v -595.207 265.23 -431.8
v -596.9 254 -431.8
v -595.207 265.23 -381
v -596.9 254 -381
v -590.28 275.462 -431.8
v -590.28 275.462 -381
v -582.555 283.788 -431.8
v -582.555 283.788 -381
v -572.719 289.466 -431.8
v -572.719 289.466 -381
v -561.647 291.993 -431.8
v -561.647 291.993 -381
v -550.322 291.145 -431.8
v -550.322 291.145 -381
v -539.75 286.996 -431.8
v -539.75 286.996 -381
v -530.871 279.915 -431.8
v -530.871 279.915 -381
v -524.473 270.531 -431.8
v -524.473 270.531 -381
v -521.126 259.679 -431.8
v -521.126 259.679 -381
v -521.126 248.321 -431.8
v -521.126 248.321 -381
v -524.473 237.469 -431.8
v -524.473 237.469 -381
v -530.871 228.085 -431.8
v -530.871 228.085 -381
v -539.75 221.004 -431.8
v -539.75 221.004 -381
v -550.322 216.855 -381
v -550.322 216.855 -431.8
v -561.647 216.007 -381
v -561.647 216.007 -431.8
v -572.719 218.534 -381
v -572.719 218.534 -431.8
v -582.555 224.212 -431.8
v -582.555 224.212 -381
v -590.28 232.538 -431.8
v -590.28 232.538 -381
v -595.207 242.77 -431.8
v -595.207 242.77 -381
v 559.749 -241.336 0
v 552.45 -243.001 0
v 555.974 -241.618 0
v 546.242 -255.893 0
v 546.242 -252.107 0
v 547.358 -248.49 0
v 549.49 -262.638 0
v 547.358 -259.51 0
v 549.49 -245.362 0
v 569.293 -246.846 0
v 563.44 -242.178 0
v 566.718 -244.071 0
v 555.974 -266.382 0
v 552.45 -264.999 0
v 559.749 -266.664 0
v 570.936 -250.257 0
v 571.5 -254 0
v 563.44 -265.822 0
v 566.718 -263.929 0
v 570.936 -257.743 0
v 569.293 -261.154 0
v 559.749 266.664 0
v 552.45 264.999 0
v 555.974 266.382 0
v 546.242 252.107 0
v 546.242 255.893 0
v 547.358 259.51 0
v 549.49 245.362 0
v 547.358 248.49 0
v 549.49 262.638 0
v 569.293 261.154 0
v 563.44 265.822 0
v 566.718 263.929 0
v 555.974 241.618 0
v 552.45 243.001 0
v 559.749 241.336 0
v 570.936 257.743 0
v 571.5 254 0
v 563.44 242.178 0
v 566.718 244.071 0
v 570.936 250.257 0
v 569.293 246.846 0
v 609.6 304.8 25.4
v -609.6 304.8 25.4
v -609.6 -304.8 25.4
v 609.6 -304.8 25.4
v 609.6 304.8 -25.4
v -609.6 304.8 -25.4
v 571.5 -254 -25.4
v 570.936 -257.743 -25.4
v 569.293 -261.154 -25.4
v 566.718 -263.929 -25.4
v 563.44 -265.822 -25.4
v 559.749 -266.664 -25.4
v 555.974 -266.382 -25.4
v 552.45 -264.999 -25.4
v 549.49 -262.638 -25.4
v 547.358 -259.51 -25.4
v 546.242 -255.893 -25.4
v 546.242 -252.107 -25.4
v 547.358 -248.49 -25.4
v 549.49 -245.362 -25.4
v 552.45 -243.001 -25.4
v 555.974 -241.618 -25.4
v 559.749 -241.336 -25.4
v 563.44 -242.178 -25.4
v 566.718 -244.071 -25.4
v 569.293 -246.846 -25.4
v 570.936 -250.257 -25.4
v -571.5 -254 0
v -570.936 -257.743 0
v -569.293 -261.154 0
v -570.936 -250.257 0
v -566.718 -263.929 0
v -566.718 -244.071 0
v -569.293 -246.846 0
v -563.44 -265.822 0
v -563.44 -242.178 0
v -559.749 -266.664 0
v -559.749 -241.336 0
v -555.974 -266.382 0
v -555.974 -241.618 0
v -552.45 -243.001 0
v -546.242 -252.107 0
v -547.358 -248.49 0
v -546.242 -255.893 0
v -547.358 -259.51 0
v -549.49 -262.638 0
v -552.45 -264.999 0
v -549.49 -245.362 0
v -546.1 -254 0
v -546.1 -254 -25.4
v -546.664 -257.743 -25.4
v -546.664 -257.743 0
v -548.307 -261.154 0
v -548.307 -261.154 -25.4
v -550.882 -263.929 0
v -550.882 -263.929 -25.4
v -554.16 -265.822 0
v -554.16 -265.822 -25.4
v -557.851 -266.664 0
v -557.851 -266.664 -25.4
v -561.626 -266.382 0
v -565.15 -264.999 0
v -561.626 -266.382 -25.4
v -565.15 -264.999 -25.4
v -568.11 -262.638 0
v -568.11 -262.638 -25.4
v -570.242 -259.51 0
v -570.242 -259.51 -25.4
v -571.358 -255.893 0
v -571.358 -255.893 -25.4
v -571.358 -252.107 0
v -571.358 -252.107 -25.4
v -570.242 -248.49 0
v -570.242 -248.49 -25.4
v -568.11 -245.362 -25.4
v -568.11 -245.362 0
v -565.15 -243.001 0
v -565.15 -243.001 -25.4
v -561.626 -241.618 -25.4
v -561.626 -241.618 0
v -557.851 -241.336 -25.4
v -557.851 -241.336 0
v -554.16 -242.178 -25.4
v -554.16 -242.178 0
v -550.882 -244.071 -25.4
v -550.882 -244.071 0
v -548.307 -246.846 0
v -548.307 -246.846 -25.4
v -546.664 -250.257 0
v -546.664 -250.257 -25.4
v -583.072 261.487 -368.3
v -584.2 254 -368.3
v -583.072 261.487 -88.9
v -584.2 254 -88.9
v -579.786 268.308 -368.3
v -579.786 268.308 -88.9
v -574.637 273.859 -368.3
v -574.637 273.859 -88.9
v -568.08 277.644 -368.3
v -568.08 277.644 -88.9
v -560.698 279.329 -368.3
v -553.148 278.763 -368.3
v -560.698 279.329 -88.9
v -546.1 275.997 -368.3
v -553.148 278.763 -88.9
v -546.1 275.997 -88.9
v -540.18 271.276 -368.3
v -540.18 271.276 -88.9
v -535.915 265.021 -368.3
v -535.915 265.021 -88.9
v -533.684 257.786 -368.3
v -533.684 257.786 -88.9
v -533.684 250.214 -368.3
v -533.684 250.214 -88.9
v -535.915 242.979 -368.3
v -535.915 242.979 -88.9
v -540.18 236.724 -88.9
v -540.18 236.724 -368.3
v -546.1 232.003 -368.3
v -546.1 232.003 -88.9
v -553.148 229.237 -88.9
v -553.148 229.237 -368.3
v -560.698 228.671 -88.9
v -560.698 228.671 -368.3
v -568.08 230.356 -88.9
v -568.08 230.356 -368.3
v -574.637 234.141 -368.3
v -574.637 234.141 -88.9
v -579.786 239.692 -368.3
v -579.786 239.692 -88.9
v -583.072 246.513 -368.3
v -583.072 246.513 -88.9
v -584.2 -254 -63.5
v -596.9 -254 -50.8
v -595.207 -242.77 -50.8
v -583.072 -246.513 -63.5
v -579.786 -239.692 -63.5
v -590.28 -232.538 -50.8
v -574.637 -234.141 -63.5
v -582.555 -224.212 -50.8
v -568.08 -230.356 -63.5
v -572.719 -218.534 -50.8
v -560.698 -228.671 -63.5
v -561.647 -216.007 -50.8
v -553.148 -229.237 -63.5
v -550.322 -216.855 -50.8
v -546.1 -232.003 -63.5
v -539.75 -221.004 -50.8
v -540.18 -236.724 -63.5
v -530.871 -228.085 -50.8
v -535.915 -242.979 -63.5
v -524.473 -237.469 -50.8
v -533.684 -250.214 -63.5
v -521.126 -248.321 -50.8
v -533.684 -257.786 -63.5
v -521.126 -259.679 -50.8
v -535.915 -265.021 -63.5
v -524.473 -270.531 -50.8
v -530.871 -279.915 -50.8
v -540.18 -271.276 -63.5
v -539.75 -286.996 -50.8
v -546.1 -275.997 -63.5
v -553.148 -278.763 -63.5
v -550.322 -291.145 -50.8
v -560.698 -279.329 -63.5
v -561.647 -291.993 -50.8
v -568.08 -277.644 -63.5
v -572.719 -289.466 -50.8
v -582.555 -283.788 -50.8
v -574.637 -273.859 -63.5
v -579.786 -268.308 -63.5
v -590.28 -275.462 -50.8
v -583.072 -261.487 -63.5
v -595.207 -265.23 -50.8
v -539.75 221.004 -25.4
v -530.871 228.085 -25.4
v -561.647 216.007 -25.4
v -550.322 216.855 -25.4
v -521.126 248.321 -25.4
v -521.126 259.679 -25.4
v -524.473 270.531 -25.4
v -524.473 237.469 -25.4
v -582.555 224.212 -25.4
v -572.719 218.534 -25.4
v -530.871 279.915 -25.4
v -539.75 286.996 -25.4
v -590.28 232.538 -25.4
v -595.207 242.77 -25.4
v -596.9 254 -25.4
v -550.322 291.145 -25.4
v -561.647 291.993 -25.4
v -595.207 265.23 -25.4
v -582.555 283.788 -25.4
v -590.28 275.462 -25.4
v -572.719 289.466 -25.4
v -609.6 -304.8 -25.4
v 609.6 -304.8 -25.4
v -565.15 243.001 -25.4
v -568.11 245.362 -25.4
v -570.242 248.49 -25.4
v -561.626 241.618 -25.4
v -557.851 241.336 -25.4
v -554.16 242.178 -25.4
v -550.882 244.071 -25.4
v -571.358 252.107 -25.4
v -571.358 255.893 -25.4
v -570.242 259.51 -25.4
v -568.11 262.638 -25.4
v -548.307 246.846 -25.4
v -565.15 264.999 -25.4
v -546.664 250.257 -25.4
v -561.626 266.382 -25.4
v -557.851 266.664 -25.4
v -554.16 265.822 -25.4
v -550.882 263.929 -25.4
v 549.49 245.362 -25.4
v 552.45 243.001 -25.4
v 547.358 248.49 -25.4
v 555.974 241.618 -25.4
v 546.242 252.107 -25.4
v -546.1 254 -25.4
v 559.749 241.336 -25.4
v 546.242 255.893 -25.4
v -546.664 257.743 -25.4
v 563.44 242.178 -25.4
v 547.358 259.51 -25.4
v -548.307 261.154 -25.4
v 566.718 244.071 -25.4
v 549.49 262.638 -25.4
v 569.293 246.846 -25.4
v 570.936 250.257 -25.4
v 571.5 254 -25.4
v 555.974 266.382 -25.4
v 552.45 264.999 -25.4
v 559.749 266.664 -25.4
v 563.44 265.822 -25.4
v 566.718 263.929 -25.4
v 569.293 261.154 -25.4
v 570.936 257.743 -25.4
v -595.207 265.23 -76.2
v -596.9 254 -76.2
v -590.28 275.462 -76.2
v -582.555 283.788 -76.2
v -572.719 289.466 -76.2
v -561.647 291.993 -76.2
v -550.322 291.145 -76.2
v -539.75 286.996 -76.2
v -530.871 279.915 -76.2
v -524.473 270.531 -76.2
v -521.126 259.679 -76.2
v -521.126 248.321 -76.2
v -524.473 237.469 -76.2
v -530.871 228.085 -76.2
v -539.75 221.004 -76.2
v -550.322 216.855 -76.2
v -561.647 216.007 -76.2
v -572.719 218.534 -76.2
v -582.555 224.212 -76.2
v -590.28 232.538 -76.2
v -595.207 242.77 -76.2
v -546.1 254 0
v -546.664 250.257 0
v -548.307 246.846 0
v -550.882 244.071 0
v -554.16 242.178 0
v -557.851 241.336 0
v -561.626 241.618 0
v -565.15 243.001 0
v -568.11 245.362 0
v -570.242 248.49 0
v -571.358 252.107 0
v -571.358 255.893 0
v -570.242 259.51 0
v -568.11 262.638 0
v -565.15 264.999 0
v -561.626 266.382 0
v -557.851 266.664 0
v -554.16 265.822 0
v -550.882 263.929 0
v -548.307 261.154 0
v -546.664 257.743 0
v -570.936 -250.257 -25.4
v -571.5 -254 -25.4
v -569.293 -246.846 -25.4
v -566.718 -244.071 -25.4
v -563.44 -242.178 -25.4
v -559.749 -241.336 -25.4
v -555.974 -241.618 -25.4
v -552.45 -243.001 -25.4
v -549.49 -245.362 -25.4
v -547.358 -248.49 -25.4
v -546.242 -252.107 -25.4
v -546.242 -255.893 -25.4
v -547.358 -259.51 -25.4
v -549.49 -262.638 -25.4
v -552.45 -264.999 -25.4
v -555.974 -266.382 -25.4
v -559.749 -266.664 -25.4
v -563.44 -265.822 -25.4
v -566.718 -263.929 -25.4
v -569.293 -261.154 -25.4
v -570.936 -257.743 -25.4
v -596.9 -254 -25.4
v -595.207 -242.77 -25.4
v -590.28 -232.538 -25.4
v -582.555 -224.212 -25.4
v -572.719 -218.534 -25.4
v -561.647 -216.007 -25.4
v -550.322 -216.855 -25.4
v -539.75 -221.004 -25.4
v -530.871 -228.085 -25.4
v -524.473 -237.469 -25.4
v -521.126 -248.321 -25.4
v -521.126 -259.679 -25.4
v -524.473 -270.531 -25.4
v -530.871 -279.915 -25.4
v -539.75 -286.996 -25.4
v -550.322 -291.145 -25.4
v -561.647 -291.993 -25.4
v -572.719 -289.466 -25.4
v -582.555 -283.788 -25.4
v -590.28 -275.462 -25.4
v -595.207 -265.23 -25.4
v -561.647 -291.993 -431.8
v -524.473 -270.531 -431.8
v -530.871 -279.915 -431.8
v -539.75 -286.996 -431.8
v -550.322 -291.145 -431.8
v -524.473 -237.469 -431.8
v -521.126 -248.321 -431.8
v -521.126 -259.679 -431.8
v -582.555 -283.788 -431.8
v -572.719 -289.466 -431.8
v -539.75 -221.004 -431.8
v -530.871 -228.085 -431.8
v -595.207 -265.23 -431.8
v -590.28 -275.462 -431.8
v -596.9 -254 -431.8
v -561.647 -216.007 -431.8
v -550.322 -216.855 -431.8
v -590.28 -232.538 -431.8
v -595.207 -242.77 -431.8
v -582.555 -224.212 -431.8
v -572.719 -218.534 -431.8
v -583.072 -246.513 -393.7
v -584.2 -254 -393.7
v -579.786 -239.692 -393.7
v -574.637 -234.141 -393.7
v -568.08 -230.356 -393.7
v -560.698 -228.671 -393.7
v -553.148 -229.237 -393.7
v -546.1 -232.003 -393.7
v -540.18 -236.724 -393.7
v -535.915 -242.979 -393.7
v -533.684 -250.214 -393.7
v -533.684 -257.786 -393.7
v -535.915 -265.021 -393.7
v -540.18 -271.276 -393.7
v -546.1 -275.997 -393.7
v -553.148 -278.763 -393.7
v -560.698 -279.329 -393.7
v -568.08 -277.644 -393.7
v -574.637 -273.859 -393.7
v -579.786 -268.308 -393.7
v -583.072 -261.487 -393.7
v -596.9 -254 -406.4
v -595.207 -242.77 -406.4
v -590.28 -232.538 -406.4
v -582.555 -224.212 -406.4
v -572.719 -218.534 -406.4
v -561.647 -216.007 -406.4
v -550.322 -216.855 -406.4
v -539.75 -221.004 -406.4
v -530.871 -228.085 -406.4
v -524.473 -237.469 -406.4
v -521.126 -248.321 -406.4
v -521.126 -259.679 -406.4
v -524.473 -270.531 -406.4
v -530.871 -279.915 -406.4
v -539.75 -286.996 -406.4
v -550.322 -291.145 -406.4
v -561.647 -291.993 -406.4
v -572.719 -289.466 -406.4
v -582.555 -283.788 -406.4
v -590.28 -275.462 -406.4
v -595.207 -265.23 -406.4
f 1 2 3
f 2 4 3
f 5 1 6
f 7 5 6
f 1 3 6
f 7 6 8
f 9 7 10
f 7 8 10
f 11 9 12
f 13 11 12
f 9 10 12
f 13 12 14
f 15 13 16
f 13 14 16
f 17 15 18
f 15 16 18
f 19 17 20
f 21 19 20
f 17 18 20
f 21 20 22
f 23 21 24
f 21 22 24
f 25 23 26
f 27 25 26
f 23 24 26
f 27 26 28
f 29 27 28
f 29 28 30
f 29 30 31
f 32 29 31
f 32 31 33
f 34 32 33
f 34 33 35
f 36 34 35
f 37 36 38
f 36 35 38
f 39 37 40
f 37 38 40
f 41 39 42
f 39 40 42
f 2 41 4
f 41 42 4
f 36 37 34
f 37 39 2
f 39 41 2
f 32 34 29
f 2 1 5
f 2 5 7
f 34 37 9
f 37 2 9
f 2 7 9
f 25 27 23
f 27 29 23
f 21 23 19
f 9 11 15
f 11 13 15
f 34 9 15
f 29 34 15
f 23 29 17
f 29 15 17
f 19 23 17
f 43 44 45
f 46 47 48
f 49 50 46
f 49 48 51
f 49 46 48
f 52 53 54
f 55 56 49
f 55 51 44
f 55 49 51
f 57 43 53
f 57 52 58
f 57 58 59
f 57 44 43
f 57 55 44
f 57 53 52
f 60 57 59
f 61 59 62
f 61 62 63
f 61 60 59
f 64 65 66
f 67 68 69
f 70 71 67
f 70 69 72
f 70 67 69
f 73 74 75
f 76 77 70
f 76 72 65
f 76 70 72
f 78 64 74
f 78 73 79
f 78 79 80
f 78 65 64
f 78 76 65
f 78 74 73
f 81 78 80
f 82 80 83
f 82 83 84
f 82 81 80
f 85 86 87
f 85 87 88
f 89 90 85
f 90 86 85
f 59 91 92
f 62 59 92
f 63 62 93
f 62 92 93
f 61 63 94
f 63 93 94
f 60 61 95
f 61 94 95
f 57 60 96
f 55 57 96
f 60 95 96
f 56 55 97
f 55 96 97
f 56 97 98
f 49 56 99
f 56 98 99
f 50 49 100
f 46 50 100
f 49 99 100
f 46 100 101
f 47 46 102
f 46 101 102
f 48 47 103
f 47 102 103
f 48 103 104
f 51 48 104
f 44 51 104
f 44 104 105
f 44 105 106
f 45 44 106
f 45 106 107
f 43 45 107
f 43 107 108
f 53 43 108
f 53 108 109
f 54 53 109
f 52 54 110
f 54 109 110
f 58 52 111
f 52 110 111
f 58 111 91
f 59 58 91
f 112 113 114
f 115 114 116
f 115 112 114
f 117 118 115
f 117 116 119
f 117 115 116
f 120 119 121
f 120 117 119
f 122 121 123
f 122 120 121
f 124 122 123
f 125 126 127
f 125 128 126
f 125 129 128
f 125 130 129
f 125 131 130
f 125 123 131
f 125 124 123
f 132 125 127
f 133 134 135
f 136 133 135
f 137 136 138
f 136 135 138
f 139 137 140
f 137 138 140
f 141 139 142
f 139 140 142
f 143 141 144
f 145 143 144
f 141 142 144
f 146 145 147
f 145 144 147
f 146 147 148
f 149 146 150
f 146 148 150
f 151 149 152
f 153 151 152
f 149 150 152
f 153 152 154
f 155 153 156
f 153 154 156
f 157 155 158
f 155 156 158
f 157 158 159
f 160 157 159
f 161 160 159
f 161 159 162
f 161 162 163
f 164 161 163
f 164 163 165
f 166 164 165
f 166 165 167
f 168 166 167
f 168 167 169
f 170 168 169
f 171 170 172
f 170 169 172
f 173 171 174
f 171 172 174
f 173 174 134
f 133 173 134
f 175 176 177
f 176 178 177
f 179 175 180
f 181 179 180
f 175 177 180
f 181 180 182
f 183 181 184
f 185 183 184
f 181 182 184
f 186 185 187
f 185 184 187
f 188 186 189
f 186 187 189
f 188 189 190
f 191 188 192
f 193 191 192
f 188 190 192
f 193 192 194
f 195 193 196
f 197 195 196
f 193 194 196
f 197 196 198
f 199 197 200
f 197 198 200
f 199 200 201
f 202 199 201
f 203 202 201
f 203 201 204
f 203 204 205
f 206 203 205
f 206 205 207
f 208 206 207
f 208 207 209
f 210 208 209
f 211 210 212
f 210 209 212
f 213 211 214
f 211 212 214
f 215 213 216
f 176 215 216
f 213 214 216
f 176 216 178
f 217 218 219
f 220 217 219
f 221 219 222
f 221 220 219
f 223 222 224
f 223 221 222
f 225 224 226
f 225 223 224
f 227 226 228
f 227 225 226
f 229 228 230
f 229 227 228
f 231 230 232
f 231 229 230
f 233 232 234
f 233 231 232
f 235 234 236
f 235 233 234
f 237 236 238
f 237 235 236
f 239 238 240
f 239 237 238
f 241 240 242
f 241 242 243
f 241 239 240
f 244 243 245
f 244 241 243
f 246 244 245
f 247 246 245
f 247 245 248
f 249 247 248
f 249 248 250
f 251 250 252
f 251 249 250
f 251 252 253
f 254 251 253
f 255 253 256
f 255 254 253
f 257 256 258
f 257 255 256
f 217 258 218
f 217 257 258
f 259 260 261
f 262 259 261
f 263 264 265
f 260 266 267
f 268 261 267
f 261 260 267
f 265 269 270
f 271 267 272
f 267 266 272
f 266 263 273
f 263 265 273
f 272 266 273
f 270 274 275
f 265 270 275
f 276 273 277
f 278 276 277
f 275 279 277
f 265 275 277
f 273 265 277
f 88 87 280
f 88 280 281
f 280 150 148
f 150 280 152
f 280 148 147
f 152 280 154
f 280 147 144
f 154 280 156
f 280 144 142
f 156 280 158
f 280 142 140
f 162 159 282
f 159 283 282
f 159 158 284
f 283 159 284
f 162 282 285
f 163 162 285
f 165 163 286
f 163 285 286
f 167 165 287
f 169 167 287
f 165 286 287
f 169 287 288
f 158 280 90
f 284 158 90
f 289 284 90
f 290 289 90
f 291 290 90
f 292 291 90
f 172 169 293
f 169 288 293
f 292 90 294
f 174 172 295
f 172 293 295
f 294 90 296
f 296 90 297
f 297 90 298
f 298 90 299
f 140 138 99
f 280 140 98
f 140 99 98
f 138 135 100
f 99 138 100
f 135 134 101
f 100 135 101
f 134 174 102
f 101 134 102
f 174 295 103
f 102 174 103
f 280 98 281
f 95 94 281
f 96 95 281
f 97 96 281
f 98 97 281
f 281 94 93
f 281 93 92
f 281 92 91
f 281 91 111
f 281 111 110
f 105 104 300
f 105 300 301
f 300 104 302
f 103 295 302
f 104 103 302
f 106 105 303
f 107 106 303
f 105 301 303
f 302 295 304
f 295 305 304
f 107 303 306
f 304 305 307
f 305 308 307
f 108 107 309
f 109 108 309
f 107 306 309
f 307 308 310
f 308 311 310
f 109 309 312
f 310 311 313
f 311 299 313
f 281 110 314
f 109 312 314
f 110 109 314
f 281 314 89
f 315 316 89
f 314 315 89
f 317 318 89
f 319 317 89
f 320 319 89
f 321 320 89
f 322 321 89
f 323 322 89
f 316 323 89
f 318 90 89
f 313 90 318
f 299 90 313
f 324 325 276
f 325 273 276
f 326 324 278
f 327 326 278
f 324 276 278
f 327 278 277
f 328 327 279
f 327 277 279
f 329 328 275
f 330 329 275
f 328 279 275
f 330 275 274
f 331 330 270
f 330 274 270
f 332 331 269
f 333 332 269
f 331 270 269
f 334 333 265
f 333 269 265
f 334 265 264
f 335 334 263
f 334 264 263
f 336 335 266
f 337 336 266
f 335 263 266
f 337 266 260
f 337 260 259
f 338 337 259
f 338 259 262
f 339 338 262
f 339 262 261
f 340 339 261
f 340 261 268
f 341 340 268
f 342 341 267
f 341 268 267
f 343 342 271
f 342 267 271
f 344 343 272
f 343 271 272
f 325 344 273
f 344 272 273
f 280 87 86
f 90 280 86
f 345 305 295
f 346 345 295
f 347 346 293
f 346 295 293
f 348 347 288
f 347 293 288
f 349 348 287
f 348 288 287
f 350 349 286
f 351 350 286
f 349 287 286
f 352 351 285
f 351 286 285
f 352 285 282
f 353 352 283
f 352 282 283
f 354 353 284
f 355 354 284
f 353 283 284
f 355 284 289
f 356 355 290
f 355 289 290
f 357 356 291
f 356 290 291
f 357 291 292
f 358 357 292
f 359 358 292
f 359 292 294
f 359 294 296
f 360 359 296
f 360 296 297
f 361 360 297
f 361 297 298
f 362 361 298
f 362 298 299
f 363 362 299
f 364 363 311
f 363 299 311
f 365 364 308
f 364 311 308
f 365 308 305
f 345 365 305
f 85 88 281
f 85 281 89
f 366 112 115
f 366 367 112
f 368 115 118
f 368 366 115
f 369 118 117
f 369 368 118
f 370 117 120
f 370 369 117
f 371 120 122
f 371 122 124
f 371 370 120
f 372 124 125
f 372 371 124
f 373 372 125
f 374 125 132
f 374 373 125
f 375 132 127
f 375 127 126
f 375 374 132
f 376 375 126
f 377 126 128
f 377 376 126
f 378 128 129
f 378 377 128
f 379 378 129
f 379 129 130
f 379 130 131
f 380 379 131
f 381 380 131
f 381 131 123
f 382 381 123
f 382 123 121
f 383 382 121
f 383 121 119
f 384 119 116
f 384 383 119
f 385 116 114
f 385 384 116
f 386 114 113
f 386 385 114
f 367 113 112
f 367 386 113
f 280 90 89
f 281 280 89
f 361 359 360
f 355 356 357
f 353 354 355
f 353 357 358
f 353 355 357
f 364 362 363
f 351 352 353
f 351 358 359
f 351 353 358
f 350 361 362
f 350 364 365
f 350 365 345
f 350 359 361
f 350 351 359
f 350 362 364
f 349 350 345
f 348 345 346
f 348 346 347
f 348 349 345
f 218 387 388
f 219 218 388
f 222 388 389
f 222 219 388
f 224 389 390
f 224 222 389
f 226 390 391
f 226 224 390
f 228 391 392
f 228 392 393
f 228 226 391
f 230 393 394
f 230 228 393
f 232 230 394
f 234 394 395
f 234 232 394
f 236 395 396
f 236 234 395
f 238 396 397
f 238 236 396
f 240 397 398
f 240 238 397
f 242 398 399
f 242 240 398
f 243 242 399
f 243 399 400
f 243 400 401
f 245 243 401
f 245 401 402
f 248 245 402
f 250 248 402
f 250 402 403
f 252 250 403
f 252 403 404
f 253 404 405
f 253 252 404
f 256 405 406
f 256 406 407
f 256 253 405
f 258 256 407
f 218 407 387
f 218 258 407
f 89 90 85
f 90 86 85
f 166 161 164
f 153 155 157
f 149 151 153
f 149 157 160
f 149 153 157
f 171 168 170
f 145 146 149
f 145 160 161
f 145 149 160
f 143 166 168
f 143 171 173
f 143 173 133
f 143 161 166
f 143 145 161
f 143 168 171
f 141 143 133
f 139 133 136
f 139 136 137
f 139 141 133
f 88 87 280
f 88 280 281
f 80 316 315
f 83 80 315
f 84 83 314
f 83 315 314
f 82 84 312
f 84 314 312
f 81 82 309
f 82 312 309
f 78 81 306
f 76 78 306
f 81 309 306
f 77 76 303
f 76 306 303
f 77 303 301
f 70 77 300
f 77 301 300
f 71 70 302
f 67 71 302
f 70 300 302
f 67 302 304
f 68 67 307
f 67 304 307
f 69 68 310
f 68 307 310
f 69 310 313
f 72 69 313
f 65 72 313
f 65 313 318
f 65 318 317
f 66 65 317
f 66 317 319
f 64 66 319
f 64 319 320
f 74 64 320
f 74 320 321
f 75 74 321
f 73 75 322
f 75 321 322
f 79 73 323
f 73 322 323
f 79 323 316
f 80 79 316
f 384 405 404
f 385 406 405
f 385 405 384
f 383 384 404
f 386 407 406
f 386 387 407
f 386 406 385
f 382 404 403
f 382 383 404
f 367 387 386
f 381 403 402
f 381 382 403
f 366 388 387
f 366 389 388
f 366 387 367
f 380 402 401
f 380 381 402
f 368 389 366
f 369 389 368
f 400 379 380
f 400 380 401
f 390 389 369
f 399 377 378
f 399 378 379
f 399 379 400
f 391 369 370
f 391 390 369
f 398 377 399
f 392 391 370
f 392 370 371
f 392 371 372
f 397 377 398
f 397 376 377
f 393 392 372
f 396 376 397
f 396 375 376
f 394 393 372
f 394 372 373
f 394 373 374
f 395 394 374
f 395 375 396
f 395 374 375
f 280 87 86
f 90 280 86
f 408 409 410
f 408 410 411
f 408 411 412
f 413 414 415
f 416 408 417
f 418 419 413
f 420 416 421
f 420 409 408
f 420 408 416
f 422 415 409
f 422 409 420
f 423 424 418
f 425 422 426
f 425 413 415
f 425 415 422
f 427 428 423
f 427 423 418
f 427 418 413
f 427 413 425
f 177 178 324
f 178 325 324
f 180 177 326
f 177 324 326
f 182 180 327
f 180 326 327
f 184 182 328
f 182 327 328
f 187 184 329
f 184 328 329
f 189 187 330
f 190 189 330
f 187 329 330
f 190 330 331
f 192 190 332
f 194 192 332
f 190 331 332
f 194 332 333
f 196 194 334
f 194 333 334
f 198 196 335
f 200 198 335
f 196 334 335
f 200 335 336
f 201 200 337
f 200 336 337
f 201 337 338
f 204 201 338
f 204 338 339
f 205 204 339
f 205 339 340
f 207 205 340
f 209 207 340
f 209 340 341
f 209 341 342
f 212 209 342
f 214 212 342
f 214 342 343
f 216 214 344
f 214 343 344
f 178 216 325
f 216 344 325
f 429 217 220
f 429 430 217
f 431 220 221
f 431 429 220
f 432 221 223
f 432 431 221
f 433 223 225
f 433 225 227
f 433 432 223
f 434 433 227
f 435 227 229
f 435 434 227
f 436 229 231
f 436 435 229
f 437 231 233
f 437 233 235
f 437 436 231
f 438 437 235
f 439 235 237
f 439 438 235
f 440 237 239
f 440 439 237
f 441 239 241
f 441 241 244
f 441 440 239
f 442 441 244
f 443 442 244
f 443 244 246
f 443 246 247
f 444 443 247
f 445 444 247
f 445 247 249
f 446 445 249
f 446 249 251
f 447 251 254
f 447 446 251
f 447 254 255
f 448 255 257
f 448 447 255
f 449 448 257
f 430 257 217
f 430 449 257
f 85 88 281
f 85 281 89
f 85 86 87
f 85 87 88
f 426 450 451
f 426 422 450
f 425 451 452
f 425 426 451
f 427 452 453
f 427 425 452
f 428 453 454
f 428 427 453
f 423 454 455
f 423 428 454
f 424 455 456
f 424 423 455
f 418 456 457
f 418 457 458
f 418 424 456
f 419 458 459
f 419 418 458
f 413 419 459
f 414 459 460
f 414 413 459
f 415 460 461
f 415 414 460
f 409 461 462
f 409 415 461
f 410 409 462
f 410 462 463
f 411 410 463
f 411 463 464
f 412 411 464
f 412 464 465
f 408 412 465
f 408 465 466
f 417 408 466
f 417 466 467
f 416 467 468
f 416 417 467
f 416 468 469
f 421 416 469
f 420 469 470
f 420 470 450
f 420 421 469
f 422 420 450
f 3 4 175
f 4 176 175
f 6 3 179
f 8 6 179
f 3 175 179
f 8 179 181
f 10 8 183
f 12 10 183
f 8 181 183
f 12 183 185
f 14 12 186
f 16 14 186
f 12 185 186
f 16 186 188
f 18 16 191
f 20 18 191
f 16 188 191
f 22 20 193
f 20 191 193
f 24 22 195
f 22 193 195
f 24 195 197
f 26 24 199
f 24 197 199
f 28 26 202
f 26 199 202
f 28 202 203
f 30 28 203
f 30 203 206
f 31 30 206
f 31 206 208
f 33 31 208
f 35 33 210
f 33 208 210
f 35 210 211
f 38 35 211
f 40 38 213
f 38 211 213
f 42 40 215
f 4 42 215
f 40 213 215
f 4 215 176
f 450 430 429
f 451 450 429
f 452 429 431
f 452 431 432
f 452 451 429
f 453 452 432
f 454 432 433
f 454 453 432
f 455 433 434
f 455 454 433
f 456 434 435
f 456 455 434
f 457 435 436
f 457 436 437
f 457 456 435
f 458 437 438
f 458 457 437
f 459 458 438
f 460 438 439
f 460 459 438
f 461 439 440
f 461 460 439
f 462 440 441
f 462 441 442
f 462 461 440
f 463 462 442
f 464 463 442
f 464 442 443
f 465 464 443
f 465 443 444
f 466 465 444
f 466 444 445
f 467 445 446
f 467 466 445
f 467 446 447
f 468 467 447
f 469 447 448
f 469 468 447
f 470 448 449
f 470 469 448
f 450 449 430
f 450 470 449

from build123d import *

# Parameters (mm, degrees)
F0_W      = 1219.2
F0_H      = 609.6
F2_DEPTH  = 25.4
F1_W      = 1219.2
F1_H      = 609.6
F3_DEPTH  = 25.4
F4_R      = 12.7
F11_DEPTH = 25.4


with BuildPart() as f2:
    # F0 (on Top) → F2 (new body, symmetric)
    with BuildSketch(Plane.XY):
        Rectangle(F0_W, F0_H)
    extrude(amount=F2_DEPTH, both=True)

    # F4 (on face) → F11 (cut)
    with BuildSketch(Plane(origin=(0, 0, -25.4), x_dir=(1, 0, 0), z_dir=(0, 0, -1))):
        with Locations((-558.8, 254)):
            Circle(F4_R)
        with Locations((-558.8, -254)):
            Circle(F4_R)
        with Locations((558.8, -254)):
            Circle(F4_R)
        with Locations((558.8, 254)):
            Circle(F4_R)
    extrude(amount=-F11_DEPTH, mode=Mode.SUBTRACT)


with BuildPart() as f3:
    # F1 (on Top) → F3 (new body, symmetric)
    with BuildSketch(Plane.XY):
        Rectangle(F1_W, F1_H)
    extrude(amount=F3_DEPTH, both=True)


with BuildPart() as f7:
    # F6 (on plane+point) → F7 (revolve)
    with BuildSketch(Plane.XZ.offset(254)):
        Polygon((-571.5, 0), (-571.5, -25.4), (-596.9, -25.4), (-596.9, -50.8), (-584.2, -63.5), (-584.2, -393.7), (-596.9, -406.4), (-596.9, -431.8), (-558.8, -431.8), (-558.8, 0), align=None)
    revolve(axis=Axis((-558.8, -254, -215.9), (0, 0, -1)))


with BuildPart() as f10:
    # F9 (on plane+point) → F10 (revolve)
    with BuildSketch(Plane(origin=(0, 254, 0), x_dir=(-1, 0, 0), z_dir=(0, 1, 0))):
        Polygon((596.9, -25.4), (558.8, -25.4), (558.8, -431.8), (596.9, -431.8), (596.9, -381), (584.2, -368.3), (584.2, -88.9), (596.9, -76.2), align=None)
    revolve(axis=Axis((-558.8, 254, -228.6), (0, 0, -1)))


solid = Compound([f2.part, f3.part, f7.part, f10.part])
